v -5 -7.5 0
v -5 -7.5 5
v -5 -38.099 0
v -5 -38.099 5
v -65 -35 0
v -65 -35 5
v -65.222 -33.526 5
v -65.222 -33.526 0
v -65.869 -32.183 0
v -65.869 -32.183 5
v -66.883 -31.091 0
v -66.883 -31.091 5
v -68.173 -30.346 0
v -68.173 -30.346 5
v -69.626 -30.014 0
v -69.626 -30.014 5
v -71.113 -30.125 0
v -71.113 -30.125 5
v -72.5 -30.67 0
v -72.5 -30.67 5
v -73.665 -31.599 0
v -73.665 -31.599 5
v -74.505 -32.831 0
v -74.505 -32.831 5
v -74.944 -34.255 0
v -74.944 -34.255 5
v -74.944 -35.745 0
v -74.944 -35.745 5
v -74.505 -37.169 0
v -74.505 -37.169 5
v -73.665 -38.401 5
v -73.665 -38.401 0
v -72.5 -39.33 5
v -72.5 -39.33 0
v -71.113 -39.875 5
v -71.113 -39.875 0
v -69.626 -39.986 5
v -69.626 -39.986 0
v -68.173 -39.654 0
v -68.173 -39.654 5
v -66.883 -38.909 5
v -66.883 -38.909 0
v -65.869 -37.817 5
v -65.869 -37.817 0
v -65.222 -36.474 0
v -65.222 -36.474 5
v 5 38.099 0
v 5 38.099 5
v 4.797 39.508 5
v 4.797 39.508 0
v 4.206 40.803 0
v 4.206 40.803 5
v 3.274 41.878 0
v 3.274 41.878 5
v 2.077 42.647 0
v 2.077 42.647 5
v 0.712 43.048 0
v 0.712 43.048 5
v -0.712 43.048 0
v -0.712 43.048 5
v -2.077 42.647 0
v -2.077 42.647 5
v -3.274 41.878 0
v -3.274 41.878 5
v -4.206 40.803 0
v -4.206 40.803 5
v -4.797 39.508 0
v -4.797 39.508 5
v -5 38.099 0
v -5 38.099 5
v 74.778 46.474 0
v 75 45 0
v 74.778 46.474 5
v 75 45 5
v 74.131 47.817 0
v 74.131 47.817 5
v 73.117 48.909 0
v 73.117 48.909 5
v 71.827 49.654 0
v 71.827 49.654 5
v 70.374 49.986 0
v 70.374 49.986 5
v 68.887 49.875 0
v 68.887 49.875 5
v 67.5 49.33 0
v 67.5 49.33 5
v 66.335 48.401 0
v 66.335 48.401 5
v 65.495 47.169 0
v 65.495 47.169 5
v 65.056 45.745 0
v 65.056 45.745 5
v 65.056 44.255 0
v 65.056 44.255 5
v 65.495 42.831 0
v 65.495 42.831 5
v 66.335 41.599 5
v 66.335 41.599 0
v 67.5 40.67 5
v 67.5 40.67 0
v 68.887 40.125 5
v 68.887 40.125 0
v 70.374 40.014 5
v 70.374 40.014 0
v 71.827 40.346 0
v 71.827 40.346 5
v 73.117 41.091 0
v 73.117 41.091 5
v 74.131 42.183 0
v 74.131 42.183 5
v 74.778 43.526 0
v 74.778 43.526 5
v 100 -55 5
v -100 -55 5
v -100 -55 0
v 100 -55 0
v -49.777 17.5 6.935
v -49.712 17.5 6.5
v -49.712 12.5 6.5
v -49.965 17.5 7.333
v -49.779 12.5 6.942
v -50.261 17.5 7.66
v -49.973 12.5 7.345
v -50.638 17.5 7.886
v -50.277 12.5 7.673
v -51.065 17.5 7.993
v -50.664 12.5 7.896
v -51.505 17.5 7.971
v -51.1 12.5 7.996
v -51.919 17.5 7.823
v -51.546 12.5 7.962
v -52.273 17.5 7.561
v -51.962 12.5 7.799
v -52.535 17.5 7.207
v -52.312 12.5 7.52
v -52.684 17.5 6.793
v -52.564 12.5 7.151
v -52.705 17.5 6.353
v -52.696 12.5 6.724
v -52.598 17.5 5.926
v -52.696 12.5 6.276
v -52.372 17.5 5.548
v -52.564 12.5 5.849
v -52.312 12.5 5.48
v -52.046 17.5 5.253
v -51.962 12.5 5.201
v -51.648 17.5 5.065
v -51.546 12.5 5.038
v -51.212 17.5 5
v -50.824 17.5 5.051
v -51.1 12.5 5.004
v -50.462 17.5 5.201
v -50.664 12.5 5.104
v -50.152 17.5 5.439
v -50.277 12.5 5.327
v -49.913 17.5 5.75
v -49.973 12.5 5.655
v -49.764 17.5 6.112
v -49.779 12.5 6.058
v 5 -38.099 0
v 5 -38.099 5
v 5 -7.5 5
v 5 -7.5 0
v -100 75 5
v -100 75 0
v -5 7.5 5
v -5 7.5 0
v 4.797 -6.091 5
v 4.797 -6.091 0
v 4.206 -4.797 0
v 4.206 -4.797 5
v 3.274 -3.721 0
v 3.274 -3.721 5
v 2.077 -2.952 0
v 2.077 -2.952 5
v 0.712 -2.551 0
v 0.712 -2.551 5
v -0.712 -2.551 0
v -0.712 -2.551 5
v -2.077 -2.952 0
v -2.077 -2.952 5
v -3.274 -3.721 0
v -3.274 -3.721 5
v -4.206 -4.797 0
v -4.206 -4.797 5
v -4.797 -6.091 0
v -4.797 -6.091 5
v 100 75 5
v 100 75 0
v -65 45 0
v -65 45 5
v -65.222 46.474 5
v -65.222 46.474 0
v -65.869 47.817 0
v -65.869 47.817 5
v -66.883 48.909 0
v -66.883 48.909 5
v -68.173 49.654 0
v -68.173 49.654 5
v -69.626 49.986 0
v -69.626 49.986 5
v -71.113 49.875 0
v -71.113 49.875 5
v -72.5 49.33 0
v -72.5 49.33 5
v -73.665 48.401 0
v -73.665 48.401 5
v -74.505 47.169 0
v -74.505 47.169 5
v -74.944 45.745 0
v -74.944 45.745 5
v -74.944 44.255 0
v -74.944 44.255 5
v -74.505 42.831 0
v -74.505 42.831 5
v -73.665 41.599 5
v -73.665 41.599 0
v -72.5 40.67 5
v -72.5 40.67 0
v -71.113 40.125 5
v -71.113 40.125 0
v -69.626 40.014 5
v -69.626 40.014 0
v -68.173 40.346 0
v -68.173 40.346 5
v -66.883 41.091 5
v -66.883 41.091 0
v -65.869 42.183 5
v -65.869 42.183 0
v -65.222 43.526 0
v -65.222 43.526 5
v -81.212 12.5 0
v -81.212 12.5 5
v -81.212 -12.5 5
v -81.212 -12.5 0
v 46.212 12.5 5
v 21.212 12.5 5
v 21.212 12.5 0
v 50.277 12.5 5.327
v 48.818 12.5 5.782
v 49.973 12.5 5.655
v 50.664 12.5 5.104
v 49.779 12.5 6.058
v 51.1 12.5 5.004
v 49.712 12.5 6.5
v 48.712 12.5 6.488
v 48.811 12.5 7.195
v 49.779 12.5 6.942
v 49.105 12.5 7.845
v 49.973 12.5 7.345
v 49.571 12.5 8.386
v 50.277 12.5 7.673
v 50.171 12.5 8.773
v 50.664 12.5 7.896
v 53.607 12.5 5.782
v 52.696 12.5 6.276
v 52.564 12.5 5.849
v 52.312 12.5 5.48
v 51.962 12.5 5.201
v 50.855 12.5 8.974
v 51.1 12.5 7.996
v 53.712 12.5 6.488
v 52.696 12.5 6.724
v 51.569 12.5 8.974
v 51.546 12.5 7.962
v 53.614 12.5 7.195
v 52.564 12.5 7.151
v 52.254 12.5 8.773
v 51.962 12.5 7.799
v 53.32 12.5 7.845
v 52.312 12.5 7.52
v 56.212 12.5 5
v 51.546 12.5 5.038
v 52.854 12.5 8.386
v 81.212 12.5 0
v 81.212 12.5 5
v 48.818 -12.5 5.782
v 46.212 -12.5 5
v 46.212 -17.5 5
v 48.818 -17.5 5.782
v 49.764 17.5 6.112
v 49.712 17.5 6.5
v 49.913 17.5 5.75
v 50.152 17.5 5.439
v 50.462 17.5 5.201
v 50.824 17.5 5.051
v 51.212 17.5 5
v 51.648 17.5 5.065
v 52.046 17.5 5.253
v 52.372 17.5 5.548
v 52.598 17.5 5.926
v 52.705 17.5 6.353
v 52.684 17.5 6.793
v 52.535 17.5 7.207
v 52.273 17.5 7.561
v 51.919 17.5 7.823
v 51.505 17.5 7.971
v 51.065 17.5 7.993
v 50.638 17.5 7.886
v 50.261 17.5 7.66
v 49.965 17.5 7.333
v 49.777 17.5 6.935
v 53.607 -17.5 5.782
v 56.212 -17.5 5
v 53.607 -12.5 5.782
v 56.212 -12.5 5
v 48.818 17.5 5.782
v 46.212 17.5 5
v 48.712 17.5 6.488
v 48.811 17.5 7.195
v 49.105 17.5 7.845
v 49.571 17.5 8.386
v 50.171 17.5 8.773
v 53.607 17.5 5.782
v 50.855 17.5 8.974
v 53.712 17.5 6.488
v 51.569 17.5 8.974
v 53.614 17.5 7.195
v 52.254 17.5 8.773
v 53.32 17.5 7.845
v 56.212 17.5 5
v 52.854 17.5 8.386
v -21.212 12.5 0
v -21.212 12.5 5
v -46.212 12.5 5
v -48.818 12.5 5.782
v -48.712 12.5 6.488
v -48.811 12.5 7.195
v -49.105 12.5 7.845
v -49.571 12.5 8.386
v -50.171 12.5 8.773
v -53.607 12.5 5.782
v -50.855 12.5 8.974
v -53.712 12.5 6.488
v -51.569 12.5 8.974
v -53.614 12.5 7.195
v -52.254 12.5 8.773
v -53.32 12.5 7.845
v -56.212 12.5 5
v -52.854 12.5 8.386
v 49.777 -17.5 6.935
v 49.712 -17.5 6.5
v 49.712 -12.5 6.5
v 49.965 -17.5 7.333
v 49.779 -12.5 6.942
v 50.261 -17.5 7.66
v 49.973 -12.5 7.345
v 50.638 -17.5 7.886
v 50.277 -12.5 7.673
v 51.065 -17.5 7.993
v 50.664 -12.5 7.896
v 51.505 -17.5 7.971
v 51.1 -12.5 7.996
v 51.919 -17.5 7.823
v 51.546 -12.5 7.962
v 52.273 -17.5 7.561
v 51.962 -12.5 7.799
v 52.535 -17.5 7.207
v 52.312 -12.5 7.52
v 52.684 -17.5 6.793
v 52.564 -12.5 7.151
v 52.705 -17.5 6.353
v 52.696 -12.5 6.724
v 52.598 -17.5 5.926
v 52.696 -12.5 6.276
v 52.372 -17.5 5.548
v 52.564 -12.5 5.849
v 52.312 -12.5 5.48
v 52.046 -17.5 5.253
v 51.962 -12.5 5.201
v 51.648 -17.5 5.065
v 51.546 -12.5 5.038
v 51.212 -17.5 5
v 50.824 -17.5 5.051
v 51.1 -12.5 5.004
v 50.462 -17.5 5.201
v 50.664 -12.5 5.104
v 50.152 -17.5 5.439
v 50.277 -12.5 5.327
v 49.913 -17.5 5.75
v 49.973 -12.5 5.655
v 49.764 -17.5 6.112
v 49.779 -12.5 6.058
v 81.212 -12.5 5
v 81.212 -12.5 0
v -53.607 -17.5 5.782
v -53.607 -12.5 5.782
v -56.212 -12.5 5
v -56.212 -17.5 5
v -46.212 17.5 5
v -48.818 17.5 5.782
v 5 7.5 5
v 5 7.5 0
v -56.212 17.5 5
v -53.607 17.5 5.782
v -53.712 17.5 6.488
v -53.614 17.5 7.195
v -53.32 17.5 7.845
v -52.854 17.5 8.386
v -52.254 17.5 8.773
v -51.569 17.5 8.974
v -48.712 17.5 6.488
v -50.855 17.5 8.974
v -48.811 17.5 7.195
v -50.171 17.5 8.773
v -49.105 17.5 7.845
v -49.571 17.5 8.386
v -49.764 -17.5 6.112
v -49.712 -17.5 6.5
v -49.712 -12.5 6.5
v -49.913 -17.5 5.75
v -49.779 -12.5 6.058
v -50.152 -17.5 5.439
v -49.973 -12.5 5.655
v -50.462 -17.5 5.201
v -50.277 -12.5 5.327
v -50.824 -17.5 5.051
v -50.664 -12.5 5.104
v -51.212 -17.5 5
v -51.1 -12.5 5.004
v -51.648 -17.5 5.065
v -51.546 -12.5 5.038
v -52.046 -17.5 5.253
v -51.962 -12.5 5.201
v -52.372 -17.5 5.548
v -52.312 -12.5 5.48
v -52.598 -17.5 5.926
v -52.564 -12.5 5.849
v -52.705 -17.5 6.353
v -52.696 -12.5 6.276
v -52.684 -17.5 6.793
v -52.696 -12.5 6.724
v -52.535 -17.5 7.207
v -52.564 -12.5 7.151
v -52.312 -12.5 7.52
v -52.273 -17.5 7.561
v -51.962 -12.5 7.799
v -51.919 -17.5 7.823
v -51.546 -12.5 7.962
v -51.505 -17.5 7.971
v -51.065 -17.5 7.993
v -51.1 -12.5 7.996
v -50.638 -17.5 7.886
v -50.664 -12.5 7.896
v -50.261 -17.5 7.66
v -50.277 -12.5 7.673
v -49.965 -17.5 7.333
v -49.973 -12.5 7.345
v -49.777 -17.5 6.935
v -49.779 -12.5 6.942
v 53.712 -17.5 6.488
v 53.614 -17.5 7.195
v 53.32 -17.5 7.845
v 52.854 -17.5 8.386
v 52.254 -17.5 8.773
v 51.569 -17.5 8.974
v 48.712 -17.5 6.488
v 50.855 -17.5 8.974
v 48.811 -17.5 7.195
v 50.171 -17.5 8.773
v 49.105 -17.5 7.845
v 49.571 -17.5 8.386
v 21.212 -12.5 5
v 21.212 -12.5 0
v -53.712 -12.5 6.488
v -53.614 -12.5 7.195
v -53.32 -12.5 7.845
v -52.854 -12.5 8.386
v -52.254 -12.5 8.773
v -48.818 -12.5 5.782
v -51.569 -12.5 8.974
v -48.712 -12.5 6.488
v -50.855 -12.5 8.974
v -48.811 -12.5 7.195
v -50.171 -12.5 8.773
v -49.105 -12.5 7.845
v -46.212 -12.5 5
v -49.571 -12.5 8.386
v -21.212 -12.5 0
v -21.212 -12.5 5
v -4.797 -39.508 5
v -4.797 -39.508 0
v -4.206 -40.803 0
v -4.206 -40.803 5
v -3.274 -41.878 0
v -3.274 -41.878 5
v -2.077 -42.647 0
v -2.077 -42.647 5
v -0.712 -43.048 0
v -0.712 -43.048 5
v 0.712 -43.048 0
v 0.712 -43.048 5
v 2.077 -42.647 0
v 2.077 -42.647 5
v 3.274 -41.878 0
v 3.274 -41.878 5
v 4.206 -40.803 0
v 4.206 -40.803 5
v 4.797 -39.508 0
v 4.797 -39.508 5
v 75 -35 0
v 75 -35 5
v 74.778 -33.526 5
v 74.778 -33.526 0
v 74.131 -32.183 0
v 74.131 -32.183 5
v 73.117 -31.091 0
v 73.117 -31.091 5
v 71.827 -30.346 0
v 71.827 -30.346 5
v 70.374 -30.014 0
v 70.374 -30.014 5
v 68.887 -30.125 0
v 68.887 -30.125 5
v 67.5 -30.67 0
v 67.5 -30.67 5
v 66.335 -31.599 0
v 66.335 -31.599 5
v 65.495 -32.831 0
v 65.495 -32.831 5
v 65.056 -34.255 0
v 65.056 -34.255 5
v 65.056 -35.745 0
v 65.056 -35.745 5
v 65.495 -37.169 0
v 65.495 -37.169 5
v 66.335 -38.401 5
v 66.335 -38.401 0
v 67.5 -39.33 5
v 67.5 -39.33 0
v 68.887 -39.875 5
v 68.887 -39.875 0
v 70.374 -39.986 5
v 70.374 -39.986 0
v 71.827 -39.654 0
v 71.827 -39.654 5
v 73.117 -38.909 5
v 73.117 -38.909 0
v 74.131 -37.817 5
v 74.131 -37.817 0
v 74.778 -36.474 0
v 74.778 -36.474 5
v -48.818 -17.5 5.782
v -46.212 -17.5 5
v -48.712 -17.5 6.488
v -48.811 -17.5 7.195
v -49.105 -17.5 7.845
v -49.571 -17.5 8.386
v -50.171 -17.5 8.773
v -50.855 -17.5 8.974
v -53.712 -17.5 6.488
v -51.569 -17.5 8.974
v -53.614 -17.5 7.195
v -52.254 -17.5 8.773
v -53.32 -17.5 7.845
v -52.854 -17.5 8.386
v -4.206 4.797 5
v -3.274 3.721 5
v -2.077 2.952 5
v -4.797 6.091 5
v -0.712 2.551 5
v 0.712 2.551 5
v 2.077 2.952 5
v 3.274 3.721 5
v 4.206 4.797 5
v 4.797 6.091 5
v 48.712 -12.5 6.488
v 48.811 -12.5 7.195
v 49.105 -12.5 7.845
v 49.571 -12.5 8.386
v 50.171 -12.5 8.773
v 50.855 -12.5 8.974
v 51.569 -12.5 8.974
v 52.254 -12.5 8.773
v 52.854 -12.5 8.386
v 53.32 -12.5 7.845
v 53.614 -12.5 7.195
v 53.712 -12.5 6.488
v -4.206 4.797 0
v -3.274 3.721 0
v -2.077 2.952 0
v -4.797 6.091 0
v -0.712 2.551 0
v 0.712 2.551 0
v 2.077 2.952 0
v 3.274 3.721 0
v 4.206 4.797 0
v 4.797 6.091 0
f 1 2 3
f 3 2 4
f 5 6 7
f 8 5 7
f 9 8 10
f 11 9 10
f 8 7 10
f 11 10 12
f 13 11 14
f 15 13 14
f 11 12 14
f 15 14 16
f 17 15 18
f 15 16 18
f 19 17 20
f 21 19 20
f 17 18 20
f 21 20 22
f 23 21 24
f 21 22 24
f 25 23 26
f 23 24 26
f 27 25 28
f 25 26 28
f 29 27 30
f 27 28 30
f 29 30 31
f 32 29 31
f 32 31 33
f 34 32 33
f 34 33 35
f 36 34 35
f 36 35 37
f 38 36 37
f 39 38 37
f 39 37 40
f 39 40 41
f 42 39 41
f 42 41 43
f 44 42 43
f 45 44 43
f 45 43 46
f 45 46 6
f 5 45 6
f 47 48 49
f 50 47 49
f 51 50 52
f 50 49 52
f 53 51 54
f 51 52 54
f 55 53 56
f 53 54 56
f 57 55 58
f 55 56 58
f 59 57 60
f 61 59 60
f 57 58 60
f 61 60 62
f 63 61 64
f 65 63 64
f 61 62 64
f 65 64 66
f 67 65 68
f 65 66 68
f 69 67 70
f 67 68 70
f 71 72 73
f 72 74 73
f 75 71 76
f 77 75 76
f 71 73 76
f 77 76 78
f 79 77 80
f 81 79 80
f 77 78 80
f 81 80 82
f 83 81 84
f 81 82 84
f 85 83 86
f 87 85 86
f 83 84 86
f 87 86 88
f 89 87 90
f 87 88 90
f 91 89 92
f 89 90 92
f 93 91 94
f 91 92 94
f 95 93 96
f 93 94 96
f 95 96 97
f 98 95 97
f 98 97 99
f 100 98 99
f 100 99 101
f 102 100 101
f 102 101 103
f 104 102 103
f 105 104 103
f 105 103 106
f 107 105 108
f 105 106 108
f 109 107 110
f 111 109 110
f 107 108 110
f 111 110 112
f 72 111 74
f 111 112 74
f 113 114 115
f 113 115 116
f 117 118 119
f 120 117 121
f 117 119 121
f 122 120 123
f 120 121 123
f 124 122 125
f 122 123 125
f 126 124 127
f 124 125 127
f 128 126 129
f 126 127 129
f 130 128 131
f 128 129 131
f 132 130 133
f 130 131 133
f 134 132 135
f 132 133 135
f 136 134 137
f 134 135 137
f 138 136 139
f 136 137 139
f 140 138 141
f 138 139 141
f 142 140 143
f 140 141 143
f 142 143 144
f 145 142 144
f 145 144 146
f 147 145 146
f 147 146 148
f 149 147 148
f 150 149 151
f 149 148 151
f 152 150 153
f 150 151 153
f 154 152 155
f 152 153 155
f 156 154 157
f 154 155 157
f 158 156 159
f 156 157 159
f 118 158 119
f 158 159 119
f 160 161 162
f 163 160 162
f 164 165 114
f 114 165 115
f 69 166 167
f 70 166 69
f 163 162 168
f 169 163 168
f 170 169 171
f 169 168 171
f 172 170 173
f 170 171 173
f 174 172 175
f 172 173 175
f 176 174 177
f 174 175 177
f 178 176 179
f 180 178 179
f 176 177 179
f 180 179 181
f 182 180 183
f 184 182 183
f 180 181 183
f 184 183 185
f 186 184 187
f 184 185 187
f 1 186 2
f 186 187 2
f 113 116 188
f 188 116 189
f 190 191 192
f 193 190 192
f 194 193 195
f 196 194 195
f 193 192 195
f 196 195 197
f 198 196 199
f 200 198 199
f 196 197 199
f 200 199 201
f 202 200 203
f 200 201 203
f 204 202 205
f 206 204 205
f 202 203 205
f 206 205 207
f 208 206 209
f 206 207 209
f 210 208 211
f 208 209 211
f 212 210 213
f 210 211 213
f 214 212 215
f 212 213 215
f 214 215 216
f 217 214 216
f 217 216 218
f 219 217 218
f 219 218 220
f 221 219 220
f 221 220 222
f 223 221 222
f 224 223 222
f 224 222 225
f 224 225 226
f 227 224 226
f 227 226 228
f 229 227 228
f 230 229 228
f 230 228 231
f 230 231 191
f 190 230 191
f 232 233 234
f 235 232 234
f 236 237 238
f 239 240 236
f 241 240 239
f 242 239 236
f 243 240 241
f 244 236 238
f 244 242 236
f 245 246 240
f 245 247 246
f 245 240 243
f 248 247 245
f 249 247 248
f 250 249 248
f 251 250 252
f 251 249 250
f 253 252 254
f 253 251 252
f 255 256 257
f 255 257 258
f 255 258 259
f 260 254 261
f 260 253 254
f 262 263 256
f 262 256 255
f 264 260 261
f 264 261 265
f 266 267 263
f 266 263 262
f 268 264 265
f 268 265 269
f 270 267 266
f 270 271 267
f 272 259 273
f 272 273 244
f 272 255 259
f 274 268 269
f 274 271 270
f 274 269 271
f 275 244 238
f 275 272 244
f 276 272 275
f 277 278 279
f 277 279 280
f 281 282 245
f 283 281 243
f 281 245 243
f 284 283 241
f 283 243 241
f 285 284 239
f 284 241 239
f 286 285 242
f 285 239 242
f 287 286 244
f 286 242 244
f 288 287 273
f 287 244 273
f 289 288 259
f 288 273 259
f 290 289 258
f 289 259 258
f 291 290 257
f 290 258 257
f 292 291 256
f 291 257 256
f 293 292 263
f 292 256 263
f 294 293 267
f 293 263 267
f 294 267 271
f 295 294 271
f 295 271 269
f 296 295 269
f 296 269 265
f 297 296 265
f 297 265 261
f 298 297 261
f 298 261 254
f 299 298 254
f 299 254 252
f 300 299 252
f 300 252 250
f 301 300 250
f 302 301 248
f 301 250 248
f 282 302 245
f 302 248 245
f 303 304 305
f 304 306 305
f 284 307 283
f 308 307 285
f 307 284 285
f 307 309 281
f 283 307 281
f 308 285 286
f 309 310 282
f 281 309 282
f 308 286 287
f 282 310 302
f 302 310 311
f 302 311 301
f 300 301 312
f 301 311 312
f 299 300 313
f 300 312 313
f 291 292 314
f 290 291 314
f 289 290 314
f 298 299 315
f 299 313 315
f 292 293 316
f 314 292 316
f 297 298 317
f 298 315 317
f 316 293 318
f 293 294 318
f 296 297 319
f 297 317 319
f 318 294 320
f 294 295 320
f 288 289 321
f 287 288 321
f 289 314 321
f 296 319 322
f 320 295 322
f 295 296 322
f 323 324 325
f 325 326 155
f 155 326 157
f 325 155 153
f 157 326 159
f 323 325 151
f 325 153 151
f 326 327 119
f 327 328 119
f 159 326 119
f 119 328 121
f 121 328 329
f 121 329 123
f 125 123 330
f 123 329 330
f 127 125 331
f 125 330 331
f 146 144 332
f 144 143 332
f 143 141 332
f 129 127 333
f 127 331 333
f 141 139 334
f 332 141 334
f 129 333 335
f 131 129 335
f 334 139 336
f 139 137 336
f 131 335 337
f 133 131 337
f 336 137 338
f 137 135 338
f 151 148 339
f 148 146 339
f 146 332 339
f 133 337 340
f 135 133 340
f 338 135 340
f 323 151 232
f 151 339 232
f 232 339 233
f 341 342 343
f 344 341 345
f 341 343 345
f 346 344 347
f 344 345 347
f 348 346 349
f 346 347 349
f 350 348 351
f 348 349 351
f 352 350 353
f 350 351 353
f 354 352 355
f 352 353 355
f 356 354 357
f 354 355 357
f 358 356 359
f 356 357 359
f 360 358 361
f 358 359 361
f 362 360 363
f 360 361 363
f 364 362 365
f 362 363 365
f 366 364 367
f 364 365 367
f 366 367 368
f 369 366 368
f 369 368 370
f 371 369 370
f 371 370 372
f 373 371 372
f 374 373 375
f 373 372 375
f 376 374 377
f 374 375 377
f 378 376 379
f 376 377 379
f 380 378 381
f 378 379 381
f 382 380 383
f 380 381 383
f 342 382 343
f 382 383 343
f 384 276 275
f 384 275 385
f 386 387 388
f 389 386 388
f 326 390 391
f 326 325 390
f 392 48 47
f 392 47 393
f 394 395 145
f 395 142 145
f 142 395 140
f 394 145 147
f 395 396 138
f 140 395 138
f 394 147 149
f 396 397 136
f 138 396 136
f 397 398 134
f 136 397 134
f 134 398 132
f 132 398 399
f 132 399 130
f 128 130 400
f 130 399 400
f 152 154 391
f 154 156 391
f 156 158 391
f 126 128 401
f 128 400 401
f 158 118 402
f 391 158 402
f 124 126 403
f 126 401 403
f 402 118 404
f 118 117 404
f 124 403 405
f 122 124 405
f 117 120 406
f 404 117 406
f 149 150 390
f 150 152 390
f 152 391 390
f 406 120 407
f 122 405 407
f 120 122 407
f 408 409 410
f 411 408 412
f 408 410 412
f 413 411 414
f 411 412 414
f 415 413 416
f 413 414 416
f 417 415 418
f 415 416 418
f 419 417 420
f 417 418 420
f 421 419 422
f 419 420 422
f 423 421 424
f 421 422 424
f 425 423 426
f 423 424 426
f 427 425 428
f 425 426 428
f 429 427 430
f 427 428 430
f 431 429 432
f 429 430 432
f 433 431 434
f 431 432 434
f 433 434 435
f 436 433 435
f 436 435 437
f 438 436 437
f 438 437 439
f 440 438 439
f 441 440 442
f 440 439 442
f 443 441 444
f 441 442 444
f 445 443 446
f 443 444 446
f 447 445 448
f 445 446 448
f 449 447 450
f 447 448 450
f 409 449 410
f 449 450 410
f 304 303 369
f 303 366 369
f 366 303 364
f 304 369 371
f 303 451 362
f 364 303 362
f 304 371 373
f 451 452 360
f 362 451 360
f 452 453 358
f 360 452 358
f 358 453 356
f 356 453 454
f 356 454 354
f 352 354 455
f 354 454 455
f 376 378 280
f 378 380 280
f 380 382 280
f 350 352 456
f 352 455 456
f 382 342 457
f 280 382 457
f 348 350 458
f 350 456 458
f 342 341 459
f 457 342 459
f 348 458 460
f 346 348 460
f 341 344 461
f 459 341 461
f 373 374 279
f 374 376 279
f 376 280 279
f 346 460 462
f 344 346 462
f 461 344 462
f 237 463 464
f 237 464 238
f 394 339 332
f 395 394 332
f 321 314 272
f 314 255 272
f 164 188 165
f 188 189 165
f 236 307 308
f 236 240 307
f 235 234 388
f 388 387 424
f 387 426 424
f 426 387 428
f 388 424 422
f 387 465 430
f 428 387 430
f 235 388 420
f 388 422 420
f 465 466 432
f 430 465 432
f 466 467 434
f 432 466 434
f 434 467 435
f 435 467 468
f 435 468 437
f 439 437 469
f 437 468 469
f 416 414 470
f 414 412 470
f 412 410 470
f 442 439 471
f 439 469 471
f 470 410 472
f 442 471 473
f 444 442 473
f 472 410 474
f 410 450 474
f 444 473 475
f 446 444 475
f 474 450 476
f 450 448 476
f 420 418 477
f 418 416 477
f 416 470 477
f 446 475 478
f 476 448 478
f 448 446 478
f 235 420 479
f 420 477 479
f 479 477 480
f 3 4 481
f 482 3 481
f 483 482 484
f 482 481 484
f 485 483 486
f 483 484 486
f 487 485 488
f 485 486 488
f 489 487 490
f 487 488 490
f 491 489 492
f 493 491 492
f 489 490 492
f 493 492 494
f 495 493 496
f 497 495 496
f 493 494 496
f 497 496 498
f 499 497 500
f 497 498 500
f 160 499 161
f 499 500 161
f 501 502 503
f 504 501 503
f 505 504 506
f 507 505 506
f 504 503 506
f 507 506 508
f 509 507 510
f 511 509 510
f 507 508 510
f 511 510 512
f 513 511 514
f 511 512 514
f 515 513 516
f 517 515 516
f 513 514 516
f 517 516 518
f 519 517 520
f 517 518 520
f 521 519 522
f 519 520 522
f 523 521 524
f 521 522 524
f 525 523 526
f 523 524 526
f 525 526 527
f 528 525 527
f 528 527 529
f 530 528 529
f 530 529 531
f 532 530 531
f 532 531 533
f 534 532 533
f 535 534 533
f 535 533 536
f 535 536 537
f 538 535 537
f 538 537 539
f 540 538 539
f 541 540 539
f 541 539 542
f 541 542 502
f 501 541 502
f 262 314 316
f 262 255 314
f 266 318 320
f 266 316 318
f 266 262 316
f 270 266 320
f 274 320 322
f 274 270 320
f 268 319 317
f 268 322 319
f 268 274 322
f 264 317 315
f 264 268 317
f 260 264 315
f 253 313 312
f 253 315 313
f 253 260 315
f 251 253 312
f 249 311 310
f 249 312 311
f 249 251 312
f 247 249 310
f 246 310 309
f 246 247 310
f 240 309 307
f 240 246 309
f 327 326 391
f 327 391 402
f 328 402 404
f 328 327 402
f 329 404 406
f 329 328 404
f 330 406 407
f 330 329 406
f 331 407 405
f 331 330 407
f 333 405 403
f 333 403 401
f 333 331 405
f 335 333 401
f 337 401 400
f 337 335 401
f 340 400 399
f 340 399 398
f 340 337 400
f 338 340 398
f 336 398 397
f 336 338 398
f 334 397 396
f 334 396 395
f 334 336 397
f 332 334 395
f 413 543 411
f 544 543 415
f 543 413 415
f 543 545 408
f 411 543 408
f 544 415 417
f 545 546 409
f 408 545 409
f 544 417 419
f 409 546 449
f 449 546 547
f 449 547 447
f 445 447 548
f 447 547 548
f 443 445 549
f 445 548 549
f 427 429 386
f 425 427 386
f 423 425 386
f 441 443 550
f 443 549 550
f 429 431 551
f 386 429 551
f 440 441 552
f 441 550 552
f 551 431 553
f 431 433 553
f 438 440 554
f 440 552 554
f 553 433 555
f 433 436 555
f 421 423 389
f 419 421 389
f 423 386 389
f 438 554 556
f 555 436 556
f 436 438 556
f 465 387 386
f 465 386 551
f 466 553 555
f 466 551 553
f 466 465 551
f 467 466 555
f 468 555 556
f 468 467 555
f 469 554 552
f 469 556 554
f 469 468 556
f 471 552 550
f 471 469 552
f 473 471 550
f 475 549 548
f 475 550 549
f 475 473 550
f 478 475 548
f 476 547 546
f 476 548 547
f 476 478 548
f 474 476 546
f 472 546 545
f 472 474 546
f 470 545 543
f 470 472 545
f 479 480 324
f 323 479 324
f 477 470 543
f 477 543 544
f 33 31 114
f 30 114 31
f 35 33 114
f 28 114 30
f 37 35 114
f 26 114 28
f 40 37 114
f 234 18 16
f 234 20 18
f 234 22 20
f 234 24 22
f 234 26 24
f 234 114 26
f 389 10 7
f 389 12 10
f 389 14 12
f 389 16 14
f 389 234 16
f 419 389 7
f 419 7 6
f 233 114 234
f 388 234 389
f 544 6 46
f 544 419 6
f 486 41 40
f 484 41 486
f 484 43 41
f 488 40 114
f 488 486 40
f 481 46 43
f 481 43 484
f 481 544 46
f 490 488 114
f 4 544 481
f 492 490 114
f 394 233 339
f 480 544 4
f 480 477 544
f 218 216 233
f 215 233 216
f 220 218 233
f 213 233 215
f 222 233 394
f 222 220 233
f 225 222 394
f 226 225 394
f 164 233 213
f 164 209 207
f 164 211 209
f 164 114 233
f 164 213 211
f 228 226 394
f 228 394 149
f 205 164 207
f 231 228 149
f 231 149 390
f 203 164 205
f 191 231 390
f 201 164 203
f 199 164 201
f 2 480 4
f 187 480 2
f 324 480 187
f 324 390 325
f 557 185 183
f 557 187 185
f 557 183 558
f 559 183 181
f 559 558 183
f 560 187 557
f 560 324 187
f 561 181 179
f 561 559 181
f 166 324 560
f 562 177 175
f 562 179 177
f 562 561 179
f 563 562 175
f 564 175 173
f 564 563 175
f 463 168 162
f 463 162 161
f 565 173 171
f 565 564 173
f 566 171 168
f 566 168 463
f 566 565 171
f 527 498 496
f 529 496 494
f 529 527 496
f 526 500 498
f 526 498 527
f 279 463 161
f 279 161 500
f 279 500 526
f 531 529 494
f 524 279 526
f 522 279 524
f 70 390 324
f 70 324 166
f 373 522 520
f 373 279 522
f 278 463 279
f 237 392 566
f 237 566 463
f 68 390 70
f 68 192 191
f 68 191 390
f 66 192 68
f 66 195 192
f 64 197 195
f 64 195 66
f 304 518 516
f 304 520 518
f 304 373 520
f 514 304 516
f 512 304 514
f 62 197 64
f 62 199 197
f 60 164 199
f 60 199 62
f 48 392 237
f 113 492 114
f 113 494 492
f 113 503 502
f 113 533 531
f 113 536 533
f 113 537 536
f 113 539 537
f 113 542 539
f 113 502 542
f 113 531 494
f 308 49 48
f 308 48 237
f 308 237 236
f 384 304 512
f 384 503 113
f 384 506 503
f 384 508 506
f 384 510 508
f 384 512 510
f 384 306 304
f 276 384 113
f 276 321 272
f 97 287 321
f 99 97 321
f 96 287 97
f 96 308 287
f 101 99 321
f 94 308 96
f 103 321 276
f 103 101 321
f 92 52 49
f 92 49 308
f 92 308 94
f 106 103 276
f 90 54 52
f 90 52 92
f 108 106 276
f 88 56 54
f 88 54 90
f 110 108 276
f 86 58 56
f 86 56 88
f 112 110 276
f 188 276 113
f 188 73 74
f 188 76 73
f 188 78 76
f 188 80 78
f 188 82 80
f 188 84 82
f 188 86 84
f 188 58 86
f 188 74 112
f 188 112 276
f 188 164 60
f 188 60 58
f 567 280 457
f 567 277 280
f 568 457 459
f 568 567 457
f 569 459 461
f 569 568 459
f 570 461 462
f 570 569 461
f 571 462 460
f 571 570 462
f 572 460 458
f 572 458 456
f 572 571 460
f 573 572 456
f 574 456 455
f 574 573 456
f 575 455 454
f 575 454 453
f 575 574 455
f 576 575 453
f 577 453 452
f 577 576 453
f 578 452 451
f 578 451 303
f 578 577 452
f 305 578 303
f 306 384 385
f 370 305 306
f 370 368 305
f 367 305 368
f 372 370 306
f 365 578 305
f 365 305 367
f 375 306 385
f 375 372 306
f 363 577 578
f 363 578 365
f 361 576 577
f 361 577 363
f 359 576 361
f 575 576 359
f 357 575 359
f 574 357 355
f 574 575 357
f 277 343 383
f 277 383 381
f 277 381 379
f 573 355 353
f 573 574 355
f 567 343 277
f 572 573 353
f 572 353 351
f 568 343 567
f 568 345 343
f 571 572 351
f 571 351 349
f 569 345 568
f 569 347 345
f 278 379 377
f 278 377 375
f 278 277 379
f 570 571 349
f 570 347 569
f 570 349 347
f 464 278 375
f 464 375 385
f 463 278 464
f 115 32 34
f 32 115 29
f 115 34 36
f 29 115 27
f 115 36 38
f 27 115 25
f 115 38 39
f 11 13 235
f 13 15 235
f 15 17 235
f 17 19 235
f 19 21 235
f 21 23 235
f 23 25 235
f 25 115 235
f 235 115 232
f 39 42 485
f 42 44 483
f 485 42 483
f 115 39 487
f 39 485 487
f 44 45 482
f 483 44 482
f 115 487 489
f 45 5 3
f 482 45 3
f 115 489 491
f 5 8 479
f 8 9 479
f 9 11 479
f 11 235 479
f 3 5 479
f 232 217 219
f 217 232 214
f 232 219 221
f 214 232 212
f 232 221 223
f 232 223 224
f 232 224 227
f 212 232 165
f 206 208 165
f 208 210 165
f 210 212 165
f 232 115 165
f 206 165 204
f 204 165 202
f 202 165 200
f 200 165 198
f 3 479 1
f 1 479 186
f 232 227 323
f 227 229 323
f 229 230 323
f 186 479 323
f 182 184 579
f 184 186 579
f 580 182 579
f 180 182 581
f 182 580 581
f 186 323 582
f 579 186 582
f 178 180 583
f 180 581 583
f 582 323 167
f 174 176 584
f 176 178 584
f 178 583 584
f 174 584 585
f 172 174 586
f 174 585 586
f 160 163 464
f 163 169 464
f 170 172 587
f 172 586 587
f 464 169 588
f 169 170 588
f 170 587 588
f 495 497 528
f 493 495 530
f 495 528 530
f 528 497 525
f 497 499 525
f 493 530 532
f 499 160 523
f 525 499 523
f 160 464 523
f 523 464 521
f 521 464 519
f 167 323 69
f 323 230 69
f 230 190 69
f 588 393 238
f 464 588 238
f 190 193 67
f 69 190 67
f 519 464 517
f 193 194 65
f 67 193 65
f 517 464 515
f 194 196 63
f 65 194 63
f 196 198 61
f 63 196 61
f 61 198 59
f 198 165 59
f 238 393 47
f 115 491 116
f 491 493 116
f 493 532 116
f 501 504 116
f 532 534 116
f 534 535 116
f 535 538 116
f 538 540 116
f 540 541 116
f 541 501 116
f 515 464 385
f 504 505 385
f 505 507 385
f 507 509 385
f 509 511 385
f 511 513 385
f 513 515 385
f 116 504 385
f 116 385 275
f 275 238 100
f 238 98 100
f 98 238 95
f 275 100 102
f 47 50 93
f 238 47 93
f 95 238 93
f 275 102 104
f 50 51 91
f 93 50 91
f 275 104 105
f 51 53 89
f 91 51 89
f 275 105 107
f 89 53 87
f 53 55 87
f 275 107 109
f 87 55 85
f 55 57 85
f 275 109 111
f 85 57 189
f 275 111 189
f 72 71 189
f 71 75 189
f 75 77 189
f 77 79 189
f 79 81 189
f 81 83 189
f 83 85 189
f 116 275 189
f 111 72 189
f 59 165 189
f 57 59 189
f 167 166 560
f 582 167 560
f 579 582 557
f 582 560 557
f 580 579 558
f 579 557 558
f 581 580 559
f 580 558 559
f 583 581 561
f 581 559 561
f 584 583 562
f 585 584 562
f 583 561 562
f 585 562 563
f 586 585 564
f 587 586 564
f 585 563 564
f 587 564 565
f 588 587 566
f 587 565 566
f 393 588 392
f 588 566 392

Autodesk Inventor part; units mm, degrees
ref_plane "YZ Plane" through (0, 0, 0) normal (1, 0, 0) x (0, 1, 0)
ref_plane "XZ Plane" through (0, 0, 0) normal (0, 1, 0) x (-1, 0, 0)
sketch "Эскиз1" plane through (0, 0, 0) normal (0, 0, 1) x (1, 0, 0)
  line L0 (-100, -75) -> (100, -75)
  line L1 (100, -75) -> (100, 75)
  line L2 (100, 75) -> (-100, 75)
  line L3 (-100, 75) -> (-100, -75)
  line L4 (-100, -75) -> (100, 75) construction
  line L5 (100, -75) -> (-100, 75) construction
  point P0 (0, 0)
  dimension "d0" = 200
  dimension "d1" = 150
extrude "Выдавливание1" add sketch "Эскиз1" along normal blind 5
sketch "Эскиз2" plane through (0, 0, 5) normal (0, 0, 1) x (1, 0, 0)
  line L0 (-100, -75) -> (100, -75) projected
  line L1 (100, -75) -> (100, 75) projected
  line L2 (100, 75) -> (-100, 75) projected
  line L3 (-100, 75) -> (-100, -75) projected
  line L4 (100, 75) -> (-100, 75) construction
  line L5 (0, 75) -> (0, -75) construction
  line L6 (-100, 0) -> (100, 0) construction
  line L7 (100, -75) -> (100, 75) construction
  line L8 (-100, -12.5) -> (100, -12.5) construction
  line L9 (100, -12.5) -> (100, 12.5) construction
  line L10 (100, 12.5) -> (-100, 12.5) construction
  line L11 (-100, 12.5) -> (-100, -12.5) construction
  line L12 (-100, -12.5) -> (100, 12.5) construction
  line L13 (100, -12.5) -> (-100, 12.5) construction
  line L14 (-100, 0) -> (0, 0) construction
  line L15 (-51.2124, 75) -> (-51.2124, -75) construction
  line L16 (-100, -75) -> (100, -75) construction
  line L17 (0, 0) -> (100, 0) construction
  line L18 (50, 75) -> (50, -75) construction
  line L19 (-81.2124, -12.5) -> (-21.2124, -12.5)
  line L20 (-21.2124, -12.5) -> (-21.2124, 12.5)
  line L21 (-21.2124, 12.5) -> (-81.2124, 12.5)
  line L22 (-81.2124, 12.5) -> (-81.2124, -12.5)
  line L23 (-81.2124, -12.5) -> (-21.2124, 12.5) construction
  line L24 (-21.2124, -12.5) -> (-81.2124, 12.5) construction
  line L25 (81.2124, -12.5) -> (21.2124, -12.5)
  line L26 (21.2124, -12.5) -> (21.2124, 12.5)
  line L27 (21.2124, 12.5) -> (81.2124, 12.5)
  line L28 (81.2124, 12.5) -> (81.2124, -12.5)
  point P0 (-51.2124, 0)
  dimension "d4" = 25
  dimension "d5" = 60
extrude "Выдавливание2" cut sketch "Эскиз2" against normal blind 5 contours L22 L21 L20 L19 | L25 L26 L27 L28
sketch "Эскиз3" plane through (-81.2124, 12.5, 5) normal (0, -1, 0) x (1, 0, 0)
  line L0 (0, 0) -> (60, 0) projected
  line L1 (30, 0) -> (30, 14.9537) construction
  line L2 (30, 0) -> (40, 0) construction
  line L3 (30, 0) -> (35, 0) construction
  line L4 (30, 0) -> (25, 0) construction
  line L5 (25, 0) -> (35, 0) construction
  line L6 (25, 0) -> (35, 0)
  line L7 (30, 0) -> (30, 3) construction
  circle A0 centre (30, 1.5) radius 1.5
  arc A1 (32.3946, 0.7816) -> (27.6054, 0.7816) centre (30, 1.5) ccw
  line L8 (35, 0) -> (32.3946, 0.7816)
  line L9 (25, 0) -> (27.6054, 0.7816)
  point P0 (81.2124, -5)
  dimension "d8" = 10
  dimension "d9" = 5
  dimension "d10" = 5
  dimension "d11" = 3
  dimension "d12" = 1
extrude "Выдавливание3" add sketch "Эскиз3" against normal blind 5
mirror "Зеркальное отражение1" about plane through (0, 0, 0) normal (0, 1, 0) of "Выдавливание3"
sketch "Эскиз4" plane through (-81.2124, 12.5, 0) normal (0, -1, 0) x (1, 0, 0)
  circle A0 centre (30, 6.5) radius 1.5 projected
  point P0 (81.2124, 0)
surface extrude "ВыдавПврх1" sketch "Эскиз4" along normal up to next shown yes curves A0
boundary_patch "Участок поверхности1"
boundary_patch "Участок поверхности2"
ref_plane "РабПлоскость1" through (-81.2124, 0, 0) normal (0, -1, 0) x (1, 0, 0)
sketch "Эскиз6" plane through (0, 0, 5) normal (0, 0, 1) x (1, 0, 0)
  line L0 (81.2124, -12.5) -> (21.2124, -12.5) projected
  line L1 (21.2124, -12.5) -> (21.2124, 12.5) projected
  line L2 (21.2124, 12.5) -> (81.2124, 12.5) projected
  line L3 (81.2124, 12.5) -> (81.2124, -12.5) projected
  line L4 (-100, -75) -> (100, -75) projected
  line L5 (100, -75) -> (100, 75) projected
  line L6 (100, 75) -> (-100, 75) projected
  line L7 (-100, 75) -> (-100, -75) projected
  line L8 (-46.2124, -12.5) -> (-46.2124, -17.5) projected
  line L9 (-46.2124, -17.5) -> (-51.2124, -17.5) projected
  line L10 (-51.2124, -17.5) -> (-56.2124, -17.5) projected
  line L11 (-56.2124, -17.5) -> (-56.2124, -12.5) projected
  line L12 (-56.2124, -12.5) -> (-81.2124, -12.5) projected
  line L13 (-81.2124, -12.5) -> (-81.2124, 12.5) projected
  line L14 (-81.2124, 12.5) -> (-56.2124, 12.5) projected
  line L15 (-56.2124, 12.5) -> (-56.2124, 17.5) projected
  line L16 (-56.2124, 17.5) -> (-51.2124, 17.5) projected
  line L17 (-51.2124, 17.5) -> (-46.2124, 17.5) projected
  line L18 (-46.2124, 17.5) -> (-46.2124, 12.5) projected
  line L19 (-46.2124, 12.5) -> (-21.2124, 12.5) projected
  line L20 (-21.2124, 12.5) -> (-21.2124, -12.5) projected
  line L21 (-21.2124, -12.5) -> (-46.2124, -12.5) projected
  line L22 (-100, -75) -> (100, -75) construction
  line L23 (-21.2124, -75) -> (-21.2124, 75) construction
  line L24 (100, 75) -> (-100, 75) construction
  line L25 (-21.2124, 12.5) -> (-21.2124, 75) construction
  line L26 (-21.2124, 75) -> (21.2124, 75) construction
  line L27 (21.2124, 75) -> (21.2124, 12.5) construction
  line L28 (21.2124, 12.5) -> (-21.2124, 12.5) construction
  line L29 (-21.2124, 12.5) -> (-21.2124, 75) construction
  line L30 (-21.2124, -75) -> (21.2124, -75) construction
  line L31 (21.2124, -75) -> (21.2124, -12.5) construction
  line L32 (21.2124, -12.5) -> (-21.2124, -12.5) construction
  line L33 (-21.2124, -12.5) -> (-21.2124, -75) construction
  line L34 (100, -75) -> (100, 75) construction
  line L35 (-100, -7.5) -> (100, -7.5) construction
  line L36 (100, -7.5) -> (100, 7.5) construction
  line L37 (100, 7.5) -> (-100, 7.5) construction
  line L38 (-100, 7.5) -> (-100, -7.5) construction
  line L39 (-100, -7.5) -> (100, 7.5) construction
  line L40 (100, -7.5) -> (-100, 7.5) construction
  line L41 (0, 7.5) -> (0, 17.5) construction
  line L42 (0, -7.5) -> (0, -28.0993) construction
  line L43 (-21.2124, 0) -> (21.2124, 0) construction
  arc A0 (-5, -38.0993) -> (5, -38.0993) centre (0, -38.0993) ccw
  arc A1 (5, -7.5) -> (-5, -7.5) centre (0, -7.5) ccw
  line L44 (-5, -7.5) -> (-5, -38.0993)
  line L45 (5, -38.0993) -> (5, -7.5)
  line L46 (100, 0) -> (-100, 0) construction
  line L47 (-100, 75) -> (-100, -75) construction
  arc A2 (5, 38.0993) -> (-5, 38.0993) centre (0, 38.0993) ccw
  arc A3 (-5, 7.5) -> (5, 7.5) centre (0, 7.5) ccw
  line L48 (-5, 7.5) -> (-5, 38.0993)
  line L49 (5, 38.0993) -> (5, 7.5)
  point P0 (0, 0)
  point P1 (0, -17.7997)
  dimension "d24" = 15
  dimension "d25" = 10
  dimension "d38" = 10
  dimension "d39" = 10
extrude "Выдавливание5" cut sketch "Эскиз6" against normal blind 20 contours L44 A1 L45 A0 | L49 A3 L48 A2
mirror "Зеркальное отражение2" about plane through (0, 0, 0) normal (1, 0, 0) of "Выдавливание3", "ВыдавПврх1", "Зеркальное отражение1"
sketch "Эскиз7" plane through (0, 0, 5) normal (0, 0, 1) x (1, 0, 0)
  line L0 (-100, -75) -> (100, -75) projected
  line L1 (100, -75) -> (100, 75) projected
  line L2 (100, 75) -> (-100, 75) projected
  line L3 (-100, 75) -> (-100, -75) projected
  line L4 (-46.2124, -12.5) -> (-46.2124, -17.5) projected
  line L5 (-46.2124, -17.5) -> (-51.2124, -17.5) projected
  line L6 (-51.2124, -17.5) -> (-56.2124, -17.5) projected
  line L7 (-56.2124, -17.5) -> (-56.2124, -12.5) projected
  line L8 (-56.2124, -12.5) -> (-81.2124, -12.5) projected
  line L9 (-81.2124, -12.5) -> (-81.2124, 12.5) projected
  line L10 (-81.2124, 12.5) -> (-56.2124, 12.5) projected
  line L11 (-56.2124, 12.5) -> (-56.2124, 17.5) projected
  line L12 (-56.2124, 17.5) -> (-51.2124, 17.5) projected
  line L13 (-51.2124, 17.5) -> (-46.2124, 17.5) projected
  line L14 (-46.2124, 17.5) -> (-46.2124, 12.5) projected
  line L15 (-46.2124, 12.5) -> (-21.2124, 12.5) projected
  line L16 (-21.2124, 12.5) -> (-21.2124, -12.5) projected
  line L17 (-21.2124, -12.5) -> (-46.2124, -12.5) projected
  line L18 (56.2124, -12.5) -> (56.2124, -17.5) projected
  line L19 (56.2124, -17.5) -> (51.2124, -17.5) projected
  line L20 (51.2124, -17.5) -> (46.2124, -17.5) projected
  line L21 (46.2124, -17.5) -> (46.2124, -12.5) projected
  line L22 (46.2124, -12.5) -> (21.2124, -12.5) projected
  line L23 (21.2124, -12.5) -> (21.2124, 12.5) projected
  line L24 (21.2124, 12.5) -> (46.2124, 12.5) projected
  line L25 (46.2124, 12.5) -> (46.2124, 17.5) projected
  line L26 (46.2124, 17.5) -> (51.2124, 17.5) projected
  line L27 (51.2124, 17.5) -> (56.2124, 17.5) projected
  line L28 (56.2124, 17.5) -> (56.2124, 12.5) projected
  line L29 (56.2124, 12.5) -> (81.2124, 12.5) projected
  line L30 (81.2124, 12.5) -> (81.2124, -12.5) projected
  line L31 (81.2124, -12.5) -> (56.2124, -12.5) projected
  line L32 (-100, 75) -> (-70, 75) construction
  line L33 (-70, 75) -> (-70, 45) construction
  line L34 (-70, 45) -> (-100, 45) construction
  line L35 (-100, 45) -> (-100, 75) construction
  circle A0 centre (-70, 45) radius 5
  line L36 (100, -75) -> (100, 75) construction
  line L37 (100, 0) -> (-100, 0) construction
  line L38 (100, 75) -> (-100, 75) construction
  line L39 (0, 75) -> (0, -75) construction
  line L40 (-100, -75) -> (100, -75) construction
  circle A1 centre (70, 45) radius 5
  line L41 (-100, -75) -> (100, -75) projected
  line L42 (-70, -75) -> (-70, -35) construction
  line L43 (-70, -35) -> (-100, -35) construction
  circle A2 centre (-70, -35) radius 5
  line L44 (70, -75) -> (70, -35) construction
  line L45 (70, -35) -> (100, -35) construction
  circle A3 centre (70, -35) radius 5
  line L46 (-100, -75) -> (-100, -55)
  line L47 (-100, -55) -> (100, -55)
  line L48 (100, -75) -> (100, -55)
  point P0 (0, 0)
  dimension "d30" = 30
  dimension "d31" = 30
  dimension "d32" = 10
  dimension "d35" = 40
  dimension "d36" = 10
  dimension "d37" = 20
extrude "Выдавливание6" cut sketch "Эскиз7" against normal blind 20 contours L3 L47 L1 L0 | A0 | A1 | A2 | A3
properties part number "Down"
